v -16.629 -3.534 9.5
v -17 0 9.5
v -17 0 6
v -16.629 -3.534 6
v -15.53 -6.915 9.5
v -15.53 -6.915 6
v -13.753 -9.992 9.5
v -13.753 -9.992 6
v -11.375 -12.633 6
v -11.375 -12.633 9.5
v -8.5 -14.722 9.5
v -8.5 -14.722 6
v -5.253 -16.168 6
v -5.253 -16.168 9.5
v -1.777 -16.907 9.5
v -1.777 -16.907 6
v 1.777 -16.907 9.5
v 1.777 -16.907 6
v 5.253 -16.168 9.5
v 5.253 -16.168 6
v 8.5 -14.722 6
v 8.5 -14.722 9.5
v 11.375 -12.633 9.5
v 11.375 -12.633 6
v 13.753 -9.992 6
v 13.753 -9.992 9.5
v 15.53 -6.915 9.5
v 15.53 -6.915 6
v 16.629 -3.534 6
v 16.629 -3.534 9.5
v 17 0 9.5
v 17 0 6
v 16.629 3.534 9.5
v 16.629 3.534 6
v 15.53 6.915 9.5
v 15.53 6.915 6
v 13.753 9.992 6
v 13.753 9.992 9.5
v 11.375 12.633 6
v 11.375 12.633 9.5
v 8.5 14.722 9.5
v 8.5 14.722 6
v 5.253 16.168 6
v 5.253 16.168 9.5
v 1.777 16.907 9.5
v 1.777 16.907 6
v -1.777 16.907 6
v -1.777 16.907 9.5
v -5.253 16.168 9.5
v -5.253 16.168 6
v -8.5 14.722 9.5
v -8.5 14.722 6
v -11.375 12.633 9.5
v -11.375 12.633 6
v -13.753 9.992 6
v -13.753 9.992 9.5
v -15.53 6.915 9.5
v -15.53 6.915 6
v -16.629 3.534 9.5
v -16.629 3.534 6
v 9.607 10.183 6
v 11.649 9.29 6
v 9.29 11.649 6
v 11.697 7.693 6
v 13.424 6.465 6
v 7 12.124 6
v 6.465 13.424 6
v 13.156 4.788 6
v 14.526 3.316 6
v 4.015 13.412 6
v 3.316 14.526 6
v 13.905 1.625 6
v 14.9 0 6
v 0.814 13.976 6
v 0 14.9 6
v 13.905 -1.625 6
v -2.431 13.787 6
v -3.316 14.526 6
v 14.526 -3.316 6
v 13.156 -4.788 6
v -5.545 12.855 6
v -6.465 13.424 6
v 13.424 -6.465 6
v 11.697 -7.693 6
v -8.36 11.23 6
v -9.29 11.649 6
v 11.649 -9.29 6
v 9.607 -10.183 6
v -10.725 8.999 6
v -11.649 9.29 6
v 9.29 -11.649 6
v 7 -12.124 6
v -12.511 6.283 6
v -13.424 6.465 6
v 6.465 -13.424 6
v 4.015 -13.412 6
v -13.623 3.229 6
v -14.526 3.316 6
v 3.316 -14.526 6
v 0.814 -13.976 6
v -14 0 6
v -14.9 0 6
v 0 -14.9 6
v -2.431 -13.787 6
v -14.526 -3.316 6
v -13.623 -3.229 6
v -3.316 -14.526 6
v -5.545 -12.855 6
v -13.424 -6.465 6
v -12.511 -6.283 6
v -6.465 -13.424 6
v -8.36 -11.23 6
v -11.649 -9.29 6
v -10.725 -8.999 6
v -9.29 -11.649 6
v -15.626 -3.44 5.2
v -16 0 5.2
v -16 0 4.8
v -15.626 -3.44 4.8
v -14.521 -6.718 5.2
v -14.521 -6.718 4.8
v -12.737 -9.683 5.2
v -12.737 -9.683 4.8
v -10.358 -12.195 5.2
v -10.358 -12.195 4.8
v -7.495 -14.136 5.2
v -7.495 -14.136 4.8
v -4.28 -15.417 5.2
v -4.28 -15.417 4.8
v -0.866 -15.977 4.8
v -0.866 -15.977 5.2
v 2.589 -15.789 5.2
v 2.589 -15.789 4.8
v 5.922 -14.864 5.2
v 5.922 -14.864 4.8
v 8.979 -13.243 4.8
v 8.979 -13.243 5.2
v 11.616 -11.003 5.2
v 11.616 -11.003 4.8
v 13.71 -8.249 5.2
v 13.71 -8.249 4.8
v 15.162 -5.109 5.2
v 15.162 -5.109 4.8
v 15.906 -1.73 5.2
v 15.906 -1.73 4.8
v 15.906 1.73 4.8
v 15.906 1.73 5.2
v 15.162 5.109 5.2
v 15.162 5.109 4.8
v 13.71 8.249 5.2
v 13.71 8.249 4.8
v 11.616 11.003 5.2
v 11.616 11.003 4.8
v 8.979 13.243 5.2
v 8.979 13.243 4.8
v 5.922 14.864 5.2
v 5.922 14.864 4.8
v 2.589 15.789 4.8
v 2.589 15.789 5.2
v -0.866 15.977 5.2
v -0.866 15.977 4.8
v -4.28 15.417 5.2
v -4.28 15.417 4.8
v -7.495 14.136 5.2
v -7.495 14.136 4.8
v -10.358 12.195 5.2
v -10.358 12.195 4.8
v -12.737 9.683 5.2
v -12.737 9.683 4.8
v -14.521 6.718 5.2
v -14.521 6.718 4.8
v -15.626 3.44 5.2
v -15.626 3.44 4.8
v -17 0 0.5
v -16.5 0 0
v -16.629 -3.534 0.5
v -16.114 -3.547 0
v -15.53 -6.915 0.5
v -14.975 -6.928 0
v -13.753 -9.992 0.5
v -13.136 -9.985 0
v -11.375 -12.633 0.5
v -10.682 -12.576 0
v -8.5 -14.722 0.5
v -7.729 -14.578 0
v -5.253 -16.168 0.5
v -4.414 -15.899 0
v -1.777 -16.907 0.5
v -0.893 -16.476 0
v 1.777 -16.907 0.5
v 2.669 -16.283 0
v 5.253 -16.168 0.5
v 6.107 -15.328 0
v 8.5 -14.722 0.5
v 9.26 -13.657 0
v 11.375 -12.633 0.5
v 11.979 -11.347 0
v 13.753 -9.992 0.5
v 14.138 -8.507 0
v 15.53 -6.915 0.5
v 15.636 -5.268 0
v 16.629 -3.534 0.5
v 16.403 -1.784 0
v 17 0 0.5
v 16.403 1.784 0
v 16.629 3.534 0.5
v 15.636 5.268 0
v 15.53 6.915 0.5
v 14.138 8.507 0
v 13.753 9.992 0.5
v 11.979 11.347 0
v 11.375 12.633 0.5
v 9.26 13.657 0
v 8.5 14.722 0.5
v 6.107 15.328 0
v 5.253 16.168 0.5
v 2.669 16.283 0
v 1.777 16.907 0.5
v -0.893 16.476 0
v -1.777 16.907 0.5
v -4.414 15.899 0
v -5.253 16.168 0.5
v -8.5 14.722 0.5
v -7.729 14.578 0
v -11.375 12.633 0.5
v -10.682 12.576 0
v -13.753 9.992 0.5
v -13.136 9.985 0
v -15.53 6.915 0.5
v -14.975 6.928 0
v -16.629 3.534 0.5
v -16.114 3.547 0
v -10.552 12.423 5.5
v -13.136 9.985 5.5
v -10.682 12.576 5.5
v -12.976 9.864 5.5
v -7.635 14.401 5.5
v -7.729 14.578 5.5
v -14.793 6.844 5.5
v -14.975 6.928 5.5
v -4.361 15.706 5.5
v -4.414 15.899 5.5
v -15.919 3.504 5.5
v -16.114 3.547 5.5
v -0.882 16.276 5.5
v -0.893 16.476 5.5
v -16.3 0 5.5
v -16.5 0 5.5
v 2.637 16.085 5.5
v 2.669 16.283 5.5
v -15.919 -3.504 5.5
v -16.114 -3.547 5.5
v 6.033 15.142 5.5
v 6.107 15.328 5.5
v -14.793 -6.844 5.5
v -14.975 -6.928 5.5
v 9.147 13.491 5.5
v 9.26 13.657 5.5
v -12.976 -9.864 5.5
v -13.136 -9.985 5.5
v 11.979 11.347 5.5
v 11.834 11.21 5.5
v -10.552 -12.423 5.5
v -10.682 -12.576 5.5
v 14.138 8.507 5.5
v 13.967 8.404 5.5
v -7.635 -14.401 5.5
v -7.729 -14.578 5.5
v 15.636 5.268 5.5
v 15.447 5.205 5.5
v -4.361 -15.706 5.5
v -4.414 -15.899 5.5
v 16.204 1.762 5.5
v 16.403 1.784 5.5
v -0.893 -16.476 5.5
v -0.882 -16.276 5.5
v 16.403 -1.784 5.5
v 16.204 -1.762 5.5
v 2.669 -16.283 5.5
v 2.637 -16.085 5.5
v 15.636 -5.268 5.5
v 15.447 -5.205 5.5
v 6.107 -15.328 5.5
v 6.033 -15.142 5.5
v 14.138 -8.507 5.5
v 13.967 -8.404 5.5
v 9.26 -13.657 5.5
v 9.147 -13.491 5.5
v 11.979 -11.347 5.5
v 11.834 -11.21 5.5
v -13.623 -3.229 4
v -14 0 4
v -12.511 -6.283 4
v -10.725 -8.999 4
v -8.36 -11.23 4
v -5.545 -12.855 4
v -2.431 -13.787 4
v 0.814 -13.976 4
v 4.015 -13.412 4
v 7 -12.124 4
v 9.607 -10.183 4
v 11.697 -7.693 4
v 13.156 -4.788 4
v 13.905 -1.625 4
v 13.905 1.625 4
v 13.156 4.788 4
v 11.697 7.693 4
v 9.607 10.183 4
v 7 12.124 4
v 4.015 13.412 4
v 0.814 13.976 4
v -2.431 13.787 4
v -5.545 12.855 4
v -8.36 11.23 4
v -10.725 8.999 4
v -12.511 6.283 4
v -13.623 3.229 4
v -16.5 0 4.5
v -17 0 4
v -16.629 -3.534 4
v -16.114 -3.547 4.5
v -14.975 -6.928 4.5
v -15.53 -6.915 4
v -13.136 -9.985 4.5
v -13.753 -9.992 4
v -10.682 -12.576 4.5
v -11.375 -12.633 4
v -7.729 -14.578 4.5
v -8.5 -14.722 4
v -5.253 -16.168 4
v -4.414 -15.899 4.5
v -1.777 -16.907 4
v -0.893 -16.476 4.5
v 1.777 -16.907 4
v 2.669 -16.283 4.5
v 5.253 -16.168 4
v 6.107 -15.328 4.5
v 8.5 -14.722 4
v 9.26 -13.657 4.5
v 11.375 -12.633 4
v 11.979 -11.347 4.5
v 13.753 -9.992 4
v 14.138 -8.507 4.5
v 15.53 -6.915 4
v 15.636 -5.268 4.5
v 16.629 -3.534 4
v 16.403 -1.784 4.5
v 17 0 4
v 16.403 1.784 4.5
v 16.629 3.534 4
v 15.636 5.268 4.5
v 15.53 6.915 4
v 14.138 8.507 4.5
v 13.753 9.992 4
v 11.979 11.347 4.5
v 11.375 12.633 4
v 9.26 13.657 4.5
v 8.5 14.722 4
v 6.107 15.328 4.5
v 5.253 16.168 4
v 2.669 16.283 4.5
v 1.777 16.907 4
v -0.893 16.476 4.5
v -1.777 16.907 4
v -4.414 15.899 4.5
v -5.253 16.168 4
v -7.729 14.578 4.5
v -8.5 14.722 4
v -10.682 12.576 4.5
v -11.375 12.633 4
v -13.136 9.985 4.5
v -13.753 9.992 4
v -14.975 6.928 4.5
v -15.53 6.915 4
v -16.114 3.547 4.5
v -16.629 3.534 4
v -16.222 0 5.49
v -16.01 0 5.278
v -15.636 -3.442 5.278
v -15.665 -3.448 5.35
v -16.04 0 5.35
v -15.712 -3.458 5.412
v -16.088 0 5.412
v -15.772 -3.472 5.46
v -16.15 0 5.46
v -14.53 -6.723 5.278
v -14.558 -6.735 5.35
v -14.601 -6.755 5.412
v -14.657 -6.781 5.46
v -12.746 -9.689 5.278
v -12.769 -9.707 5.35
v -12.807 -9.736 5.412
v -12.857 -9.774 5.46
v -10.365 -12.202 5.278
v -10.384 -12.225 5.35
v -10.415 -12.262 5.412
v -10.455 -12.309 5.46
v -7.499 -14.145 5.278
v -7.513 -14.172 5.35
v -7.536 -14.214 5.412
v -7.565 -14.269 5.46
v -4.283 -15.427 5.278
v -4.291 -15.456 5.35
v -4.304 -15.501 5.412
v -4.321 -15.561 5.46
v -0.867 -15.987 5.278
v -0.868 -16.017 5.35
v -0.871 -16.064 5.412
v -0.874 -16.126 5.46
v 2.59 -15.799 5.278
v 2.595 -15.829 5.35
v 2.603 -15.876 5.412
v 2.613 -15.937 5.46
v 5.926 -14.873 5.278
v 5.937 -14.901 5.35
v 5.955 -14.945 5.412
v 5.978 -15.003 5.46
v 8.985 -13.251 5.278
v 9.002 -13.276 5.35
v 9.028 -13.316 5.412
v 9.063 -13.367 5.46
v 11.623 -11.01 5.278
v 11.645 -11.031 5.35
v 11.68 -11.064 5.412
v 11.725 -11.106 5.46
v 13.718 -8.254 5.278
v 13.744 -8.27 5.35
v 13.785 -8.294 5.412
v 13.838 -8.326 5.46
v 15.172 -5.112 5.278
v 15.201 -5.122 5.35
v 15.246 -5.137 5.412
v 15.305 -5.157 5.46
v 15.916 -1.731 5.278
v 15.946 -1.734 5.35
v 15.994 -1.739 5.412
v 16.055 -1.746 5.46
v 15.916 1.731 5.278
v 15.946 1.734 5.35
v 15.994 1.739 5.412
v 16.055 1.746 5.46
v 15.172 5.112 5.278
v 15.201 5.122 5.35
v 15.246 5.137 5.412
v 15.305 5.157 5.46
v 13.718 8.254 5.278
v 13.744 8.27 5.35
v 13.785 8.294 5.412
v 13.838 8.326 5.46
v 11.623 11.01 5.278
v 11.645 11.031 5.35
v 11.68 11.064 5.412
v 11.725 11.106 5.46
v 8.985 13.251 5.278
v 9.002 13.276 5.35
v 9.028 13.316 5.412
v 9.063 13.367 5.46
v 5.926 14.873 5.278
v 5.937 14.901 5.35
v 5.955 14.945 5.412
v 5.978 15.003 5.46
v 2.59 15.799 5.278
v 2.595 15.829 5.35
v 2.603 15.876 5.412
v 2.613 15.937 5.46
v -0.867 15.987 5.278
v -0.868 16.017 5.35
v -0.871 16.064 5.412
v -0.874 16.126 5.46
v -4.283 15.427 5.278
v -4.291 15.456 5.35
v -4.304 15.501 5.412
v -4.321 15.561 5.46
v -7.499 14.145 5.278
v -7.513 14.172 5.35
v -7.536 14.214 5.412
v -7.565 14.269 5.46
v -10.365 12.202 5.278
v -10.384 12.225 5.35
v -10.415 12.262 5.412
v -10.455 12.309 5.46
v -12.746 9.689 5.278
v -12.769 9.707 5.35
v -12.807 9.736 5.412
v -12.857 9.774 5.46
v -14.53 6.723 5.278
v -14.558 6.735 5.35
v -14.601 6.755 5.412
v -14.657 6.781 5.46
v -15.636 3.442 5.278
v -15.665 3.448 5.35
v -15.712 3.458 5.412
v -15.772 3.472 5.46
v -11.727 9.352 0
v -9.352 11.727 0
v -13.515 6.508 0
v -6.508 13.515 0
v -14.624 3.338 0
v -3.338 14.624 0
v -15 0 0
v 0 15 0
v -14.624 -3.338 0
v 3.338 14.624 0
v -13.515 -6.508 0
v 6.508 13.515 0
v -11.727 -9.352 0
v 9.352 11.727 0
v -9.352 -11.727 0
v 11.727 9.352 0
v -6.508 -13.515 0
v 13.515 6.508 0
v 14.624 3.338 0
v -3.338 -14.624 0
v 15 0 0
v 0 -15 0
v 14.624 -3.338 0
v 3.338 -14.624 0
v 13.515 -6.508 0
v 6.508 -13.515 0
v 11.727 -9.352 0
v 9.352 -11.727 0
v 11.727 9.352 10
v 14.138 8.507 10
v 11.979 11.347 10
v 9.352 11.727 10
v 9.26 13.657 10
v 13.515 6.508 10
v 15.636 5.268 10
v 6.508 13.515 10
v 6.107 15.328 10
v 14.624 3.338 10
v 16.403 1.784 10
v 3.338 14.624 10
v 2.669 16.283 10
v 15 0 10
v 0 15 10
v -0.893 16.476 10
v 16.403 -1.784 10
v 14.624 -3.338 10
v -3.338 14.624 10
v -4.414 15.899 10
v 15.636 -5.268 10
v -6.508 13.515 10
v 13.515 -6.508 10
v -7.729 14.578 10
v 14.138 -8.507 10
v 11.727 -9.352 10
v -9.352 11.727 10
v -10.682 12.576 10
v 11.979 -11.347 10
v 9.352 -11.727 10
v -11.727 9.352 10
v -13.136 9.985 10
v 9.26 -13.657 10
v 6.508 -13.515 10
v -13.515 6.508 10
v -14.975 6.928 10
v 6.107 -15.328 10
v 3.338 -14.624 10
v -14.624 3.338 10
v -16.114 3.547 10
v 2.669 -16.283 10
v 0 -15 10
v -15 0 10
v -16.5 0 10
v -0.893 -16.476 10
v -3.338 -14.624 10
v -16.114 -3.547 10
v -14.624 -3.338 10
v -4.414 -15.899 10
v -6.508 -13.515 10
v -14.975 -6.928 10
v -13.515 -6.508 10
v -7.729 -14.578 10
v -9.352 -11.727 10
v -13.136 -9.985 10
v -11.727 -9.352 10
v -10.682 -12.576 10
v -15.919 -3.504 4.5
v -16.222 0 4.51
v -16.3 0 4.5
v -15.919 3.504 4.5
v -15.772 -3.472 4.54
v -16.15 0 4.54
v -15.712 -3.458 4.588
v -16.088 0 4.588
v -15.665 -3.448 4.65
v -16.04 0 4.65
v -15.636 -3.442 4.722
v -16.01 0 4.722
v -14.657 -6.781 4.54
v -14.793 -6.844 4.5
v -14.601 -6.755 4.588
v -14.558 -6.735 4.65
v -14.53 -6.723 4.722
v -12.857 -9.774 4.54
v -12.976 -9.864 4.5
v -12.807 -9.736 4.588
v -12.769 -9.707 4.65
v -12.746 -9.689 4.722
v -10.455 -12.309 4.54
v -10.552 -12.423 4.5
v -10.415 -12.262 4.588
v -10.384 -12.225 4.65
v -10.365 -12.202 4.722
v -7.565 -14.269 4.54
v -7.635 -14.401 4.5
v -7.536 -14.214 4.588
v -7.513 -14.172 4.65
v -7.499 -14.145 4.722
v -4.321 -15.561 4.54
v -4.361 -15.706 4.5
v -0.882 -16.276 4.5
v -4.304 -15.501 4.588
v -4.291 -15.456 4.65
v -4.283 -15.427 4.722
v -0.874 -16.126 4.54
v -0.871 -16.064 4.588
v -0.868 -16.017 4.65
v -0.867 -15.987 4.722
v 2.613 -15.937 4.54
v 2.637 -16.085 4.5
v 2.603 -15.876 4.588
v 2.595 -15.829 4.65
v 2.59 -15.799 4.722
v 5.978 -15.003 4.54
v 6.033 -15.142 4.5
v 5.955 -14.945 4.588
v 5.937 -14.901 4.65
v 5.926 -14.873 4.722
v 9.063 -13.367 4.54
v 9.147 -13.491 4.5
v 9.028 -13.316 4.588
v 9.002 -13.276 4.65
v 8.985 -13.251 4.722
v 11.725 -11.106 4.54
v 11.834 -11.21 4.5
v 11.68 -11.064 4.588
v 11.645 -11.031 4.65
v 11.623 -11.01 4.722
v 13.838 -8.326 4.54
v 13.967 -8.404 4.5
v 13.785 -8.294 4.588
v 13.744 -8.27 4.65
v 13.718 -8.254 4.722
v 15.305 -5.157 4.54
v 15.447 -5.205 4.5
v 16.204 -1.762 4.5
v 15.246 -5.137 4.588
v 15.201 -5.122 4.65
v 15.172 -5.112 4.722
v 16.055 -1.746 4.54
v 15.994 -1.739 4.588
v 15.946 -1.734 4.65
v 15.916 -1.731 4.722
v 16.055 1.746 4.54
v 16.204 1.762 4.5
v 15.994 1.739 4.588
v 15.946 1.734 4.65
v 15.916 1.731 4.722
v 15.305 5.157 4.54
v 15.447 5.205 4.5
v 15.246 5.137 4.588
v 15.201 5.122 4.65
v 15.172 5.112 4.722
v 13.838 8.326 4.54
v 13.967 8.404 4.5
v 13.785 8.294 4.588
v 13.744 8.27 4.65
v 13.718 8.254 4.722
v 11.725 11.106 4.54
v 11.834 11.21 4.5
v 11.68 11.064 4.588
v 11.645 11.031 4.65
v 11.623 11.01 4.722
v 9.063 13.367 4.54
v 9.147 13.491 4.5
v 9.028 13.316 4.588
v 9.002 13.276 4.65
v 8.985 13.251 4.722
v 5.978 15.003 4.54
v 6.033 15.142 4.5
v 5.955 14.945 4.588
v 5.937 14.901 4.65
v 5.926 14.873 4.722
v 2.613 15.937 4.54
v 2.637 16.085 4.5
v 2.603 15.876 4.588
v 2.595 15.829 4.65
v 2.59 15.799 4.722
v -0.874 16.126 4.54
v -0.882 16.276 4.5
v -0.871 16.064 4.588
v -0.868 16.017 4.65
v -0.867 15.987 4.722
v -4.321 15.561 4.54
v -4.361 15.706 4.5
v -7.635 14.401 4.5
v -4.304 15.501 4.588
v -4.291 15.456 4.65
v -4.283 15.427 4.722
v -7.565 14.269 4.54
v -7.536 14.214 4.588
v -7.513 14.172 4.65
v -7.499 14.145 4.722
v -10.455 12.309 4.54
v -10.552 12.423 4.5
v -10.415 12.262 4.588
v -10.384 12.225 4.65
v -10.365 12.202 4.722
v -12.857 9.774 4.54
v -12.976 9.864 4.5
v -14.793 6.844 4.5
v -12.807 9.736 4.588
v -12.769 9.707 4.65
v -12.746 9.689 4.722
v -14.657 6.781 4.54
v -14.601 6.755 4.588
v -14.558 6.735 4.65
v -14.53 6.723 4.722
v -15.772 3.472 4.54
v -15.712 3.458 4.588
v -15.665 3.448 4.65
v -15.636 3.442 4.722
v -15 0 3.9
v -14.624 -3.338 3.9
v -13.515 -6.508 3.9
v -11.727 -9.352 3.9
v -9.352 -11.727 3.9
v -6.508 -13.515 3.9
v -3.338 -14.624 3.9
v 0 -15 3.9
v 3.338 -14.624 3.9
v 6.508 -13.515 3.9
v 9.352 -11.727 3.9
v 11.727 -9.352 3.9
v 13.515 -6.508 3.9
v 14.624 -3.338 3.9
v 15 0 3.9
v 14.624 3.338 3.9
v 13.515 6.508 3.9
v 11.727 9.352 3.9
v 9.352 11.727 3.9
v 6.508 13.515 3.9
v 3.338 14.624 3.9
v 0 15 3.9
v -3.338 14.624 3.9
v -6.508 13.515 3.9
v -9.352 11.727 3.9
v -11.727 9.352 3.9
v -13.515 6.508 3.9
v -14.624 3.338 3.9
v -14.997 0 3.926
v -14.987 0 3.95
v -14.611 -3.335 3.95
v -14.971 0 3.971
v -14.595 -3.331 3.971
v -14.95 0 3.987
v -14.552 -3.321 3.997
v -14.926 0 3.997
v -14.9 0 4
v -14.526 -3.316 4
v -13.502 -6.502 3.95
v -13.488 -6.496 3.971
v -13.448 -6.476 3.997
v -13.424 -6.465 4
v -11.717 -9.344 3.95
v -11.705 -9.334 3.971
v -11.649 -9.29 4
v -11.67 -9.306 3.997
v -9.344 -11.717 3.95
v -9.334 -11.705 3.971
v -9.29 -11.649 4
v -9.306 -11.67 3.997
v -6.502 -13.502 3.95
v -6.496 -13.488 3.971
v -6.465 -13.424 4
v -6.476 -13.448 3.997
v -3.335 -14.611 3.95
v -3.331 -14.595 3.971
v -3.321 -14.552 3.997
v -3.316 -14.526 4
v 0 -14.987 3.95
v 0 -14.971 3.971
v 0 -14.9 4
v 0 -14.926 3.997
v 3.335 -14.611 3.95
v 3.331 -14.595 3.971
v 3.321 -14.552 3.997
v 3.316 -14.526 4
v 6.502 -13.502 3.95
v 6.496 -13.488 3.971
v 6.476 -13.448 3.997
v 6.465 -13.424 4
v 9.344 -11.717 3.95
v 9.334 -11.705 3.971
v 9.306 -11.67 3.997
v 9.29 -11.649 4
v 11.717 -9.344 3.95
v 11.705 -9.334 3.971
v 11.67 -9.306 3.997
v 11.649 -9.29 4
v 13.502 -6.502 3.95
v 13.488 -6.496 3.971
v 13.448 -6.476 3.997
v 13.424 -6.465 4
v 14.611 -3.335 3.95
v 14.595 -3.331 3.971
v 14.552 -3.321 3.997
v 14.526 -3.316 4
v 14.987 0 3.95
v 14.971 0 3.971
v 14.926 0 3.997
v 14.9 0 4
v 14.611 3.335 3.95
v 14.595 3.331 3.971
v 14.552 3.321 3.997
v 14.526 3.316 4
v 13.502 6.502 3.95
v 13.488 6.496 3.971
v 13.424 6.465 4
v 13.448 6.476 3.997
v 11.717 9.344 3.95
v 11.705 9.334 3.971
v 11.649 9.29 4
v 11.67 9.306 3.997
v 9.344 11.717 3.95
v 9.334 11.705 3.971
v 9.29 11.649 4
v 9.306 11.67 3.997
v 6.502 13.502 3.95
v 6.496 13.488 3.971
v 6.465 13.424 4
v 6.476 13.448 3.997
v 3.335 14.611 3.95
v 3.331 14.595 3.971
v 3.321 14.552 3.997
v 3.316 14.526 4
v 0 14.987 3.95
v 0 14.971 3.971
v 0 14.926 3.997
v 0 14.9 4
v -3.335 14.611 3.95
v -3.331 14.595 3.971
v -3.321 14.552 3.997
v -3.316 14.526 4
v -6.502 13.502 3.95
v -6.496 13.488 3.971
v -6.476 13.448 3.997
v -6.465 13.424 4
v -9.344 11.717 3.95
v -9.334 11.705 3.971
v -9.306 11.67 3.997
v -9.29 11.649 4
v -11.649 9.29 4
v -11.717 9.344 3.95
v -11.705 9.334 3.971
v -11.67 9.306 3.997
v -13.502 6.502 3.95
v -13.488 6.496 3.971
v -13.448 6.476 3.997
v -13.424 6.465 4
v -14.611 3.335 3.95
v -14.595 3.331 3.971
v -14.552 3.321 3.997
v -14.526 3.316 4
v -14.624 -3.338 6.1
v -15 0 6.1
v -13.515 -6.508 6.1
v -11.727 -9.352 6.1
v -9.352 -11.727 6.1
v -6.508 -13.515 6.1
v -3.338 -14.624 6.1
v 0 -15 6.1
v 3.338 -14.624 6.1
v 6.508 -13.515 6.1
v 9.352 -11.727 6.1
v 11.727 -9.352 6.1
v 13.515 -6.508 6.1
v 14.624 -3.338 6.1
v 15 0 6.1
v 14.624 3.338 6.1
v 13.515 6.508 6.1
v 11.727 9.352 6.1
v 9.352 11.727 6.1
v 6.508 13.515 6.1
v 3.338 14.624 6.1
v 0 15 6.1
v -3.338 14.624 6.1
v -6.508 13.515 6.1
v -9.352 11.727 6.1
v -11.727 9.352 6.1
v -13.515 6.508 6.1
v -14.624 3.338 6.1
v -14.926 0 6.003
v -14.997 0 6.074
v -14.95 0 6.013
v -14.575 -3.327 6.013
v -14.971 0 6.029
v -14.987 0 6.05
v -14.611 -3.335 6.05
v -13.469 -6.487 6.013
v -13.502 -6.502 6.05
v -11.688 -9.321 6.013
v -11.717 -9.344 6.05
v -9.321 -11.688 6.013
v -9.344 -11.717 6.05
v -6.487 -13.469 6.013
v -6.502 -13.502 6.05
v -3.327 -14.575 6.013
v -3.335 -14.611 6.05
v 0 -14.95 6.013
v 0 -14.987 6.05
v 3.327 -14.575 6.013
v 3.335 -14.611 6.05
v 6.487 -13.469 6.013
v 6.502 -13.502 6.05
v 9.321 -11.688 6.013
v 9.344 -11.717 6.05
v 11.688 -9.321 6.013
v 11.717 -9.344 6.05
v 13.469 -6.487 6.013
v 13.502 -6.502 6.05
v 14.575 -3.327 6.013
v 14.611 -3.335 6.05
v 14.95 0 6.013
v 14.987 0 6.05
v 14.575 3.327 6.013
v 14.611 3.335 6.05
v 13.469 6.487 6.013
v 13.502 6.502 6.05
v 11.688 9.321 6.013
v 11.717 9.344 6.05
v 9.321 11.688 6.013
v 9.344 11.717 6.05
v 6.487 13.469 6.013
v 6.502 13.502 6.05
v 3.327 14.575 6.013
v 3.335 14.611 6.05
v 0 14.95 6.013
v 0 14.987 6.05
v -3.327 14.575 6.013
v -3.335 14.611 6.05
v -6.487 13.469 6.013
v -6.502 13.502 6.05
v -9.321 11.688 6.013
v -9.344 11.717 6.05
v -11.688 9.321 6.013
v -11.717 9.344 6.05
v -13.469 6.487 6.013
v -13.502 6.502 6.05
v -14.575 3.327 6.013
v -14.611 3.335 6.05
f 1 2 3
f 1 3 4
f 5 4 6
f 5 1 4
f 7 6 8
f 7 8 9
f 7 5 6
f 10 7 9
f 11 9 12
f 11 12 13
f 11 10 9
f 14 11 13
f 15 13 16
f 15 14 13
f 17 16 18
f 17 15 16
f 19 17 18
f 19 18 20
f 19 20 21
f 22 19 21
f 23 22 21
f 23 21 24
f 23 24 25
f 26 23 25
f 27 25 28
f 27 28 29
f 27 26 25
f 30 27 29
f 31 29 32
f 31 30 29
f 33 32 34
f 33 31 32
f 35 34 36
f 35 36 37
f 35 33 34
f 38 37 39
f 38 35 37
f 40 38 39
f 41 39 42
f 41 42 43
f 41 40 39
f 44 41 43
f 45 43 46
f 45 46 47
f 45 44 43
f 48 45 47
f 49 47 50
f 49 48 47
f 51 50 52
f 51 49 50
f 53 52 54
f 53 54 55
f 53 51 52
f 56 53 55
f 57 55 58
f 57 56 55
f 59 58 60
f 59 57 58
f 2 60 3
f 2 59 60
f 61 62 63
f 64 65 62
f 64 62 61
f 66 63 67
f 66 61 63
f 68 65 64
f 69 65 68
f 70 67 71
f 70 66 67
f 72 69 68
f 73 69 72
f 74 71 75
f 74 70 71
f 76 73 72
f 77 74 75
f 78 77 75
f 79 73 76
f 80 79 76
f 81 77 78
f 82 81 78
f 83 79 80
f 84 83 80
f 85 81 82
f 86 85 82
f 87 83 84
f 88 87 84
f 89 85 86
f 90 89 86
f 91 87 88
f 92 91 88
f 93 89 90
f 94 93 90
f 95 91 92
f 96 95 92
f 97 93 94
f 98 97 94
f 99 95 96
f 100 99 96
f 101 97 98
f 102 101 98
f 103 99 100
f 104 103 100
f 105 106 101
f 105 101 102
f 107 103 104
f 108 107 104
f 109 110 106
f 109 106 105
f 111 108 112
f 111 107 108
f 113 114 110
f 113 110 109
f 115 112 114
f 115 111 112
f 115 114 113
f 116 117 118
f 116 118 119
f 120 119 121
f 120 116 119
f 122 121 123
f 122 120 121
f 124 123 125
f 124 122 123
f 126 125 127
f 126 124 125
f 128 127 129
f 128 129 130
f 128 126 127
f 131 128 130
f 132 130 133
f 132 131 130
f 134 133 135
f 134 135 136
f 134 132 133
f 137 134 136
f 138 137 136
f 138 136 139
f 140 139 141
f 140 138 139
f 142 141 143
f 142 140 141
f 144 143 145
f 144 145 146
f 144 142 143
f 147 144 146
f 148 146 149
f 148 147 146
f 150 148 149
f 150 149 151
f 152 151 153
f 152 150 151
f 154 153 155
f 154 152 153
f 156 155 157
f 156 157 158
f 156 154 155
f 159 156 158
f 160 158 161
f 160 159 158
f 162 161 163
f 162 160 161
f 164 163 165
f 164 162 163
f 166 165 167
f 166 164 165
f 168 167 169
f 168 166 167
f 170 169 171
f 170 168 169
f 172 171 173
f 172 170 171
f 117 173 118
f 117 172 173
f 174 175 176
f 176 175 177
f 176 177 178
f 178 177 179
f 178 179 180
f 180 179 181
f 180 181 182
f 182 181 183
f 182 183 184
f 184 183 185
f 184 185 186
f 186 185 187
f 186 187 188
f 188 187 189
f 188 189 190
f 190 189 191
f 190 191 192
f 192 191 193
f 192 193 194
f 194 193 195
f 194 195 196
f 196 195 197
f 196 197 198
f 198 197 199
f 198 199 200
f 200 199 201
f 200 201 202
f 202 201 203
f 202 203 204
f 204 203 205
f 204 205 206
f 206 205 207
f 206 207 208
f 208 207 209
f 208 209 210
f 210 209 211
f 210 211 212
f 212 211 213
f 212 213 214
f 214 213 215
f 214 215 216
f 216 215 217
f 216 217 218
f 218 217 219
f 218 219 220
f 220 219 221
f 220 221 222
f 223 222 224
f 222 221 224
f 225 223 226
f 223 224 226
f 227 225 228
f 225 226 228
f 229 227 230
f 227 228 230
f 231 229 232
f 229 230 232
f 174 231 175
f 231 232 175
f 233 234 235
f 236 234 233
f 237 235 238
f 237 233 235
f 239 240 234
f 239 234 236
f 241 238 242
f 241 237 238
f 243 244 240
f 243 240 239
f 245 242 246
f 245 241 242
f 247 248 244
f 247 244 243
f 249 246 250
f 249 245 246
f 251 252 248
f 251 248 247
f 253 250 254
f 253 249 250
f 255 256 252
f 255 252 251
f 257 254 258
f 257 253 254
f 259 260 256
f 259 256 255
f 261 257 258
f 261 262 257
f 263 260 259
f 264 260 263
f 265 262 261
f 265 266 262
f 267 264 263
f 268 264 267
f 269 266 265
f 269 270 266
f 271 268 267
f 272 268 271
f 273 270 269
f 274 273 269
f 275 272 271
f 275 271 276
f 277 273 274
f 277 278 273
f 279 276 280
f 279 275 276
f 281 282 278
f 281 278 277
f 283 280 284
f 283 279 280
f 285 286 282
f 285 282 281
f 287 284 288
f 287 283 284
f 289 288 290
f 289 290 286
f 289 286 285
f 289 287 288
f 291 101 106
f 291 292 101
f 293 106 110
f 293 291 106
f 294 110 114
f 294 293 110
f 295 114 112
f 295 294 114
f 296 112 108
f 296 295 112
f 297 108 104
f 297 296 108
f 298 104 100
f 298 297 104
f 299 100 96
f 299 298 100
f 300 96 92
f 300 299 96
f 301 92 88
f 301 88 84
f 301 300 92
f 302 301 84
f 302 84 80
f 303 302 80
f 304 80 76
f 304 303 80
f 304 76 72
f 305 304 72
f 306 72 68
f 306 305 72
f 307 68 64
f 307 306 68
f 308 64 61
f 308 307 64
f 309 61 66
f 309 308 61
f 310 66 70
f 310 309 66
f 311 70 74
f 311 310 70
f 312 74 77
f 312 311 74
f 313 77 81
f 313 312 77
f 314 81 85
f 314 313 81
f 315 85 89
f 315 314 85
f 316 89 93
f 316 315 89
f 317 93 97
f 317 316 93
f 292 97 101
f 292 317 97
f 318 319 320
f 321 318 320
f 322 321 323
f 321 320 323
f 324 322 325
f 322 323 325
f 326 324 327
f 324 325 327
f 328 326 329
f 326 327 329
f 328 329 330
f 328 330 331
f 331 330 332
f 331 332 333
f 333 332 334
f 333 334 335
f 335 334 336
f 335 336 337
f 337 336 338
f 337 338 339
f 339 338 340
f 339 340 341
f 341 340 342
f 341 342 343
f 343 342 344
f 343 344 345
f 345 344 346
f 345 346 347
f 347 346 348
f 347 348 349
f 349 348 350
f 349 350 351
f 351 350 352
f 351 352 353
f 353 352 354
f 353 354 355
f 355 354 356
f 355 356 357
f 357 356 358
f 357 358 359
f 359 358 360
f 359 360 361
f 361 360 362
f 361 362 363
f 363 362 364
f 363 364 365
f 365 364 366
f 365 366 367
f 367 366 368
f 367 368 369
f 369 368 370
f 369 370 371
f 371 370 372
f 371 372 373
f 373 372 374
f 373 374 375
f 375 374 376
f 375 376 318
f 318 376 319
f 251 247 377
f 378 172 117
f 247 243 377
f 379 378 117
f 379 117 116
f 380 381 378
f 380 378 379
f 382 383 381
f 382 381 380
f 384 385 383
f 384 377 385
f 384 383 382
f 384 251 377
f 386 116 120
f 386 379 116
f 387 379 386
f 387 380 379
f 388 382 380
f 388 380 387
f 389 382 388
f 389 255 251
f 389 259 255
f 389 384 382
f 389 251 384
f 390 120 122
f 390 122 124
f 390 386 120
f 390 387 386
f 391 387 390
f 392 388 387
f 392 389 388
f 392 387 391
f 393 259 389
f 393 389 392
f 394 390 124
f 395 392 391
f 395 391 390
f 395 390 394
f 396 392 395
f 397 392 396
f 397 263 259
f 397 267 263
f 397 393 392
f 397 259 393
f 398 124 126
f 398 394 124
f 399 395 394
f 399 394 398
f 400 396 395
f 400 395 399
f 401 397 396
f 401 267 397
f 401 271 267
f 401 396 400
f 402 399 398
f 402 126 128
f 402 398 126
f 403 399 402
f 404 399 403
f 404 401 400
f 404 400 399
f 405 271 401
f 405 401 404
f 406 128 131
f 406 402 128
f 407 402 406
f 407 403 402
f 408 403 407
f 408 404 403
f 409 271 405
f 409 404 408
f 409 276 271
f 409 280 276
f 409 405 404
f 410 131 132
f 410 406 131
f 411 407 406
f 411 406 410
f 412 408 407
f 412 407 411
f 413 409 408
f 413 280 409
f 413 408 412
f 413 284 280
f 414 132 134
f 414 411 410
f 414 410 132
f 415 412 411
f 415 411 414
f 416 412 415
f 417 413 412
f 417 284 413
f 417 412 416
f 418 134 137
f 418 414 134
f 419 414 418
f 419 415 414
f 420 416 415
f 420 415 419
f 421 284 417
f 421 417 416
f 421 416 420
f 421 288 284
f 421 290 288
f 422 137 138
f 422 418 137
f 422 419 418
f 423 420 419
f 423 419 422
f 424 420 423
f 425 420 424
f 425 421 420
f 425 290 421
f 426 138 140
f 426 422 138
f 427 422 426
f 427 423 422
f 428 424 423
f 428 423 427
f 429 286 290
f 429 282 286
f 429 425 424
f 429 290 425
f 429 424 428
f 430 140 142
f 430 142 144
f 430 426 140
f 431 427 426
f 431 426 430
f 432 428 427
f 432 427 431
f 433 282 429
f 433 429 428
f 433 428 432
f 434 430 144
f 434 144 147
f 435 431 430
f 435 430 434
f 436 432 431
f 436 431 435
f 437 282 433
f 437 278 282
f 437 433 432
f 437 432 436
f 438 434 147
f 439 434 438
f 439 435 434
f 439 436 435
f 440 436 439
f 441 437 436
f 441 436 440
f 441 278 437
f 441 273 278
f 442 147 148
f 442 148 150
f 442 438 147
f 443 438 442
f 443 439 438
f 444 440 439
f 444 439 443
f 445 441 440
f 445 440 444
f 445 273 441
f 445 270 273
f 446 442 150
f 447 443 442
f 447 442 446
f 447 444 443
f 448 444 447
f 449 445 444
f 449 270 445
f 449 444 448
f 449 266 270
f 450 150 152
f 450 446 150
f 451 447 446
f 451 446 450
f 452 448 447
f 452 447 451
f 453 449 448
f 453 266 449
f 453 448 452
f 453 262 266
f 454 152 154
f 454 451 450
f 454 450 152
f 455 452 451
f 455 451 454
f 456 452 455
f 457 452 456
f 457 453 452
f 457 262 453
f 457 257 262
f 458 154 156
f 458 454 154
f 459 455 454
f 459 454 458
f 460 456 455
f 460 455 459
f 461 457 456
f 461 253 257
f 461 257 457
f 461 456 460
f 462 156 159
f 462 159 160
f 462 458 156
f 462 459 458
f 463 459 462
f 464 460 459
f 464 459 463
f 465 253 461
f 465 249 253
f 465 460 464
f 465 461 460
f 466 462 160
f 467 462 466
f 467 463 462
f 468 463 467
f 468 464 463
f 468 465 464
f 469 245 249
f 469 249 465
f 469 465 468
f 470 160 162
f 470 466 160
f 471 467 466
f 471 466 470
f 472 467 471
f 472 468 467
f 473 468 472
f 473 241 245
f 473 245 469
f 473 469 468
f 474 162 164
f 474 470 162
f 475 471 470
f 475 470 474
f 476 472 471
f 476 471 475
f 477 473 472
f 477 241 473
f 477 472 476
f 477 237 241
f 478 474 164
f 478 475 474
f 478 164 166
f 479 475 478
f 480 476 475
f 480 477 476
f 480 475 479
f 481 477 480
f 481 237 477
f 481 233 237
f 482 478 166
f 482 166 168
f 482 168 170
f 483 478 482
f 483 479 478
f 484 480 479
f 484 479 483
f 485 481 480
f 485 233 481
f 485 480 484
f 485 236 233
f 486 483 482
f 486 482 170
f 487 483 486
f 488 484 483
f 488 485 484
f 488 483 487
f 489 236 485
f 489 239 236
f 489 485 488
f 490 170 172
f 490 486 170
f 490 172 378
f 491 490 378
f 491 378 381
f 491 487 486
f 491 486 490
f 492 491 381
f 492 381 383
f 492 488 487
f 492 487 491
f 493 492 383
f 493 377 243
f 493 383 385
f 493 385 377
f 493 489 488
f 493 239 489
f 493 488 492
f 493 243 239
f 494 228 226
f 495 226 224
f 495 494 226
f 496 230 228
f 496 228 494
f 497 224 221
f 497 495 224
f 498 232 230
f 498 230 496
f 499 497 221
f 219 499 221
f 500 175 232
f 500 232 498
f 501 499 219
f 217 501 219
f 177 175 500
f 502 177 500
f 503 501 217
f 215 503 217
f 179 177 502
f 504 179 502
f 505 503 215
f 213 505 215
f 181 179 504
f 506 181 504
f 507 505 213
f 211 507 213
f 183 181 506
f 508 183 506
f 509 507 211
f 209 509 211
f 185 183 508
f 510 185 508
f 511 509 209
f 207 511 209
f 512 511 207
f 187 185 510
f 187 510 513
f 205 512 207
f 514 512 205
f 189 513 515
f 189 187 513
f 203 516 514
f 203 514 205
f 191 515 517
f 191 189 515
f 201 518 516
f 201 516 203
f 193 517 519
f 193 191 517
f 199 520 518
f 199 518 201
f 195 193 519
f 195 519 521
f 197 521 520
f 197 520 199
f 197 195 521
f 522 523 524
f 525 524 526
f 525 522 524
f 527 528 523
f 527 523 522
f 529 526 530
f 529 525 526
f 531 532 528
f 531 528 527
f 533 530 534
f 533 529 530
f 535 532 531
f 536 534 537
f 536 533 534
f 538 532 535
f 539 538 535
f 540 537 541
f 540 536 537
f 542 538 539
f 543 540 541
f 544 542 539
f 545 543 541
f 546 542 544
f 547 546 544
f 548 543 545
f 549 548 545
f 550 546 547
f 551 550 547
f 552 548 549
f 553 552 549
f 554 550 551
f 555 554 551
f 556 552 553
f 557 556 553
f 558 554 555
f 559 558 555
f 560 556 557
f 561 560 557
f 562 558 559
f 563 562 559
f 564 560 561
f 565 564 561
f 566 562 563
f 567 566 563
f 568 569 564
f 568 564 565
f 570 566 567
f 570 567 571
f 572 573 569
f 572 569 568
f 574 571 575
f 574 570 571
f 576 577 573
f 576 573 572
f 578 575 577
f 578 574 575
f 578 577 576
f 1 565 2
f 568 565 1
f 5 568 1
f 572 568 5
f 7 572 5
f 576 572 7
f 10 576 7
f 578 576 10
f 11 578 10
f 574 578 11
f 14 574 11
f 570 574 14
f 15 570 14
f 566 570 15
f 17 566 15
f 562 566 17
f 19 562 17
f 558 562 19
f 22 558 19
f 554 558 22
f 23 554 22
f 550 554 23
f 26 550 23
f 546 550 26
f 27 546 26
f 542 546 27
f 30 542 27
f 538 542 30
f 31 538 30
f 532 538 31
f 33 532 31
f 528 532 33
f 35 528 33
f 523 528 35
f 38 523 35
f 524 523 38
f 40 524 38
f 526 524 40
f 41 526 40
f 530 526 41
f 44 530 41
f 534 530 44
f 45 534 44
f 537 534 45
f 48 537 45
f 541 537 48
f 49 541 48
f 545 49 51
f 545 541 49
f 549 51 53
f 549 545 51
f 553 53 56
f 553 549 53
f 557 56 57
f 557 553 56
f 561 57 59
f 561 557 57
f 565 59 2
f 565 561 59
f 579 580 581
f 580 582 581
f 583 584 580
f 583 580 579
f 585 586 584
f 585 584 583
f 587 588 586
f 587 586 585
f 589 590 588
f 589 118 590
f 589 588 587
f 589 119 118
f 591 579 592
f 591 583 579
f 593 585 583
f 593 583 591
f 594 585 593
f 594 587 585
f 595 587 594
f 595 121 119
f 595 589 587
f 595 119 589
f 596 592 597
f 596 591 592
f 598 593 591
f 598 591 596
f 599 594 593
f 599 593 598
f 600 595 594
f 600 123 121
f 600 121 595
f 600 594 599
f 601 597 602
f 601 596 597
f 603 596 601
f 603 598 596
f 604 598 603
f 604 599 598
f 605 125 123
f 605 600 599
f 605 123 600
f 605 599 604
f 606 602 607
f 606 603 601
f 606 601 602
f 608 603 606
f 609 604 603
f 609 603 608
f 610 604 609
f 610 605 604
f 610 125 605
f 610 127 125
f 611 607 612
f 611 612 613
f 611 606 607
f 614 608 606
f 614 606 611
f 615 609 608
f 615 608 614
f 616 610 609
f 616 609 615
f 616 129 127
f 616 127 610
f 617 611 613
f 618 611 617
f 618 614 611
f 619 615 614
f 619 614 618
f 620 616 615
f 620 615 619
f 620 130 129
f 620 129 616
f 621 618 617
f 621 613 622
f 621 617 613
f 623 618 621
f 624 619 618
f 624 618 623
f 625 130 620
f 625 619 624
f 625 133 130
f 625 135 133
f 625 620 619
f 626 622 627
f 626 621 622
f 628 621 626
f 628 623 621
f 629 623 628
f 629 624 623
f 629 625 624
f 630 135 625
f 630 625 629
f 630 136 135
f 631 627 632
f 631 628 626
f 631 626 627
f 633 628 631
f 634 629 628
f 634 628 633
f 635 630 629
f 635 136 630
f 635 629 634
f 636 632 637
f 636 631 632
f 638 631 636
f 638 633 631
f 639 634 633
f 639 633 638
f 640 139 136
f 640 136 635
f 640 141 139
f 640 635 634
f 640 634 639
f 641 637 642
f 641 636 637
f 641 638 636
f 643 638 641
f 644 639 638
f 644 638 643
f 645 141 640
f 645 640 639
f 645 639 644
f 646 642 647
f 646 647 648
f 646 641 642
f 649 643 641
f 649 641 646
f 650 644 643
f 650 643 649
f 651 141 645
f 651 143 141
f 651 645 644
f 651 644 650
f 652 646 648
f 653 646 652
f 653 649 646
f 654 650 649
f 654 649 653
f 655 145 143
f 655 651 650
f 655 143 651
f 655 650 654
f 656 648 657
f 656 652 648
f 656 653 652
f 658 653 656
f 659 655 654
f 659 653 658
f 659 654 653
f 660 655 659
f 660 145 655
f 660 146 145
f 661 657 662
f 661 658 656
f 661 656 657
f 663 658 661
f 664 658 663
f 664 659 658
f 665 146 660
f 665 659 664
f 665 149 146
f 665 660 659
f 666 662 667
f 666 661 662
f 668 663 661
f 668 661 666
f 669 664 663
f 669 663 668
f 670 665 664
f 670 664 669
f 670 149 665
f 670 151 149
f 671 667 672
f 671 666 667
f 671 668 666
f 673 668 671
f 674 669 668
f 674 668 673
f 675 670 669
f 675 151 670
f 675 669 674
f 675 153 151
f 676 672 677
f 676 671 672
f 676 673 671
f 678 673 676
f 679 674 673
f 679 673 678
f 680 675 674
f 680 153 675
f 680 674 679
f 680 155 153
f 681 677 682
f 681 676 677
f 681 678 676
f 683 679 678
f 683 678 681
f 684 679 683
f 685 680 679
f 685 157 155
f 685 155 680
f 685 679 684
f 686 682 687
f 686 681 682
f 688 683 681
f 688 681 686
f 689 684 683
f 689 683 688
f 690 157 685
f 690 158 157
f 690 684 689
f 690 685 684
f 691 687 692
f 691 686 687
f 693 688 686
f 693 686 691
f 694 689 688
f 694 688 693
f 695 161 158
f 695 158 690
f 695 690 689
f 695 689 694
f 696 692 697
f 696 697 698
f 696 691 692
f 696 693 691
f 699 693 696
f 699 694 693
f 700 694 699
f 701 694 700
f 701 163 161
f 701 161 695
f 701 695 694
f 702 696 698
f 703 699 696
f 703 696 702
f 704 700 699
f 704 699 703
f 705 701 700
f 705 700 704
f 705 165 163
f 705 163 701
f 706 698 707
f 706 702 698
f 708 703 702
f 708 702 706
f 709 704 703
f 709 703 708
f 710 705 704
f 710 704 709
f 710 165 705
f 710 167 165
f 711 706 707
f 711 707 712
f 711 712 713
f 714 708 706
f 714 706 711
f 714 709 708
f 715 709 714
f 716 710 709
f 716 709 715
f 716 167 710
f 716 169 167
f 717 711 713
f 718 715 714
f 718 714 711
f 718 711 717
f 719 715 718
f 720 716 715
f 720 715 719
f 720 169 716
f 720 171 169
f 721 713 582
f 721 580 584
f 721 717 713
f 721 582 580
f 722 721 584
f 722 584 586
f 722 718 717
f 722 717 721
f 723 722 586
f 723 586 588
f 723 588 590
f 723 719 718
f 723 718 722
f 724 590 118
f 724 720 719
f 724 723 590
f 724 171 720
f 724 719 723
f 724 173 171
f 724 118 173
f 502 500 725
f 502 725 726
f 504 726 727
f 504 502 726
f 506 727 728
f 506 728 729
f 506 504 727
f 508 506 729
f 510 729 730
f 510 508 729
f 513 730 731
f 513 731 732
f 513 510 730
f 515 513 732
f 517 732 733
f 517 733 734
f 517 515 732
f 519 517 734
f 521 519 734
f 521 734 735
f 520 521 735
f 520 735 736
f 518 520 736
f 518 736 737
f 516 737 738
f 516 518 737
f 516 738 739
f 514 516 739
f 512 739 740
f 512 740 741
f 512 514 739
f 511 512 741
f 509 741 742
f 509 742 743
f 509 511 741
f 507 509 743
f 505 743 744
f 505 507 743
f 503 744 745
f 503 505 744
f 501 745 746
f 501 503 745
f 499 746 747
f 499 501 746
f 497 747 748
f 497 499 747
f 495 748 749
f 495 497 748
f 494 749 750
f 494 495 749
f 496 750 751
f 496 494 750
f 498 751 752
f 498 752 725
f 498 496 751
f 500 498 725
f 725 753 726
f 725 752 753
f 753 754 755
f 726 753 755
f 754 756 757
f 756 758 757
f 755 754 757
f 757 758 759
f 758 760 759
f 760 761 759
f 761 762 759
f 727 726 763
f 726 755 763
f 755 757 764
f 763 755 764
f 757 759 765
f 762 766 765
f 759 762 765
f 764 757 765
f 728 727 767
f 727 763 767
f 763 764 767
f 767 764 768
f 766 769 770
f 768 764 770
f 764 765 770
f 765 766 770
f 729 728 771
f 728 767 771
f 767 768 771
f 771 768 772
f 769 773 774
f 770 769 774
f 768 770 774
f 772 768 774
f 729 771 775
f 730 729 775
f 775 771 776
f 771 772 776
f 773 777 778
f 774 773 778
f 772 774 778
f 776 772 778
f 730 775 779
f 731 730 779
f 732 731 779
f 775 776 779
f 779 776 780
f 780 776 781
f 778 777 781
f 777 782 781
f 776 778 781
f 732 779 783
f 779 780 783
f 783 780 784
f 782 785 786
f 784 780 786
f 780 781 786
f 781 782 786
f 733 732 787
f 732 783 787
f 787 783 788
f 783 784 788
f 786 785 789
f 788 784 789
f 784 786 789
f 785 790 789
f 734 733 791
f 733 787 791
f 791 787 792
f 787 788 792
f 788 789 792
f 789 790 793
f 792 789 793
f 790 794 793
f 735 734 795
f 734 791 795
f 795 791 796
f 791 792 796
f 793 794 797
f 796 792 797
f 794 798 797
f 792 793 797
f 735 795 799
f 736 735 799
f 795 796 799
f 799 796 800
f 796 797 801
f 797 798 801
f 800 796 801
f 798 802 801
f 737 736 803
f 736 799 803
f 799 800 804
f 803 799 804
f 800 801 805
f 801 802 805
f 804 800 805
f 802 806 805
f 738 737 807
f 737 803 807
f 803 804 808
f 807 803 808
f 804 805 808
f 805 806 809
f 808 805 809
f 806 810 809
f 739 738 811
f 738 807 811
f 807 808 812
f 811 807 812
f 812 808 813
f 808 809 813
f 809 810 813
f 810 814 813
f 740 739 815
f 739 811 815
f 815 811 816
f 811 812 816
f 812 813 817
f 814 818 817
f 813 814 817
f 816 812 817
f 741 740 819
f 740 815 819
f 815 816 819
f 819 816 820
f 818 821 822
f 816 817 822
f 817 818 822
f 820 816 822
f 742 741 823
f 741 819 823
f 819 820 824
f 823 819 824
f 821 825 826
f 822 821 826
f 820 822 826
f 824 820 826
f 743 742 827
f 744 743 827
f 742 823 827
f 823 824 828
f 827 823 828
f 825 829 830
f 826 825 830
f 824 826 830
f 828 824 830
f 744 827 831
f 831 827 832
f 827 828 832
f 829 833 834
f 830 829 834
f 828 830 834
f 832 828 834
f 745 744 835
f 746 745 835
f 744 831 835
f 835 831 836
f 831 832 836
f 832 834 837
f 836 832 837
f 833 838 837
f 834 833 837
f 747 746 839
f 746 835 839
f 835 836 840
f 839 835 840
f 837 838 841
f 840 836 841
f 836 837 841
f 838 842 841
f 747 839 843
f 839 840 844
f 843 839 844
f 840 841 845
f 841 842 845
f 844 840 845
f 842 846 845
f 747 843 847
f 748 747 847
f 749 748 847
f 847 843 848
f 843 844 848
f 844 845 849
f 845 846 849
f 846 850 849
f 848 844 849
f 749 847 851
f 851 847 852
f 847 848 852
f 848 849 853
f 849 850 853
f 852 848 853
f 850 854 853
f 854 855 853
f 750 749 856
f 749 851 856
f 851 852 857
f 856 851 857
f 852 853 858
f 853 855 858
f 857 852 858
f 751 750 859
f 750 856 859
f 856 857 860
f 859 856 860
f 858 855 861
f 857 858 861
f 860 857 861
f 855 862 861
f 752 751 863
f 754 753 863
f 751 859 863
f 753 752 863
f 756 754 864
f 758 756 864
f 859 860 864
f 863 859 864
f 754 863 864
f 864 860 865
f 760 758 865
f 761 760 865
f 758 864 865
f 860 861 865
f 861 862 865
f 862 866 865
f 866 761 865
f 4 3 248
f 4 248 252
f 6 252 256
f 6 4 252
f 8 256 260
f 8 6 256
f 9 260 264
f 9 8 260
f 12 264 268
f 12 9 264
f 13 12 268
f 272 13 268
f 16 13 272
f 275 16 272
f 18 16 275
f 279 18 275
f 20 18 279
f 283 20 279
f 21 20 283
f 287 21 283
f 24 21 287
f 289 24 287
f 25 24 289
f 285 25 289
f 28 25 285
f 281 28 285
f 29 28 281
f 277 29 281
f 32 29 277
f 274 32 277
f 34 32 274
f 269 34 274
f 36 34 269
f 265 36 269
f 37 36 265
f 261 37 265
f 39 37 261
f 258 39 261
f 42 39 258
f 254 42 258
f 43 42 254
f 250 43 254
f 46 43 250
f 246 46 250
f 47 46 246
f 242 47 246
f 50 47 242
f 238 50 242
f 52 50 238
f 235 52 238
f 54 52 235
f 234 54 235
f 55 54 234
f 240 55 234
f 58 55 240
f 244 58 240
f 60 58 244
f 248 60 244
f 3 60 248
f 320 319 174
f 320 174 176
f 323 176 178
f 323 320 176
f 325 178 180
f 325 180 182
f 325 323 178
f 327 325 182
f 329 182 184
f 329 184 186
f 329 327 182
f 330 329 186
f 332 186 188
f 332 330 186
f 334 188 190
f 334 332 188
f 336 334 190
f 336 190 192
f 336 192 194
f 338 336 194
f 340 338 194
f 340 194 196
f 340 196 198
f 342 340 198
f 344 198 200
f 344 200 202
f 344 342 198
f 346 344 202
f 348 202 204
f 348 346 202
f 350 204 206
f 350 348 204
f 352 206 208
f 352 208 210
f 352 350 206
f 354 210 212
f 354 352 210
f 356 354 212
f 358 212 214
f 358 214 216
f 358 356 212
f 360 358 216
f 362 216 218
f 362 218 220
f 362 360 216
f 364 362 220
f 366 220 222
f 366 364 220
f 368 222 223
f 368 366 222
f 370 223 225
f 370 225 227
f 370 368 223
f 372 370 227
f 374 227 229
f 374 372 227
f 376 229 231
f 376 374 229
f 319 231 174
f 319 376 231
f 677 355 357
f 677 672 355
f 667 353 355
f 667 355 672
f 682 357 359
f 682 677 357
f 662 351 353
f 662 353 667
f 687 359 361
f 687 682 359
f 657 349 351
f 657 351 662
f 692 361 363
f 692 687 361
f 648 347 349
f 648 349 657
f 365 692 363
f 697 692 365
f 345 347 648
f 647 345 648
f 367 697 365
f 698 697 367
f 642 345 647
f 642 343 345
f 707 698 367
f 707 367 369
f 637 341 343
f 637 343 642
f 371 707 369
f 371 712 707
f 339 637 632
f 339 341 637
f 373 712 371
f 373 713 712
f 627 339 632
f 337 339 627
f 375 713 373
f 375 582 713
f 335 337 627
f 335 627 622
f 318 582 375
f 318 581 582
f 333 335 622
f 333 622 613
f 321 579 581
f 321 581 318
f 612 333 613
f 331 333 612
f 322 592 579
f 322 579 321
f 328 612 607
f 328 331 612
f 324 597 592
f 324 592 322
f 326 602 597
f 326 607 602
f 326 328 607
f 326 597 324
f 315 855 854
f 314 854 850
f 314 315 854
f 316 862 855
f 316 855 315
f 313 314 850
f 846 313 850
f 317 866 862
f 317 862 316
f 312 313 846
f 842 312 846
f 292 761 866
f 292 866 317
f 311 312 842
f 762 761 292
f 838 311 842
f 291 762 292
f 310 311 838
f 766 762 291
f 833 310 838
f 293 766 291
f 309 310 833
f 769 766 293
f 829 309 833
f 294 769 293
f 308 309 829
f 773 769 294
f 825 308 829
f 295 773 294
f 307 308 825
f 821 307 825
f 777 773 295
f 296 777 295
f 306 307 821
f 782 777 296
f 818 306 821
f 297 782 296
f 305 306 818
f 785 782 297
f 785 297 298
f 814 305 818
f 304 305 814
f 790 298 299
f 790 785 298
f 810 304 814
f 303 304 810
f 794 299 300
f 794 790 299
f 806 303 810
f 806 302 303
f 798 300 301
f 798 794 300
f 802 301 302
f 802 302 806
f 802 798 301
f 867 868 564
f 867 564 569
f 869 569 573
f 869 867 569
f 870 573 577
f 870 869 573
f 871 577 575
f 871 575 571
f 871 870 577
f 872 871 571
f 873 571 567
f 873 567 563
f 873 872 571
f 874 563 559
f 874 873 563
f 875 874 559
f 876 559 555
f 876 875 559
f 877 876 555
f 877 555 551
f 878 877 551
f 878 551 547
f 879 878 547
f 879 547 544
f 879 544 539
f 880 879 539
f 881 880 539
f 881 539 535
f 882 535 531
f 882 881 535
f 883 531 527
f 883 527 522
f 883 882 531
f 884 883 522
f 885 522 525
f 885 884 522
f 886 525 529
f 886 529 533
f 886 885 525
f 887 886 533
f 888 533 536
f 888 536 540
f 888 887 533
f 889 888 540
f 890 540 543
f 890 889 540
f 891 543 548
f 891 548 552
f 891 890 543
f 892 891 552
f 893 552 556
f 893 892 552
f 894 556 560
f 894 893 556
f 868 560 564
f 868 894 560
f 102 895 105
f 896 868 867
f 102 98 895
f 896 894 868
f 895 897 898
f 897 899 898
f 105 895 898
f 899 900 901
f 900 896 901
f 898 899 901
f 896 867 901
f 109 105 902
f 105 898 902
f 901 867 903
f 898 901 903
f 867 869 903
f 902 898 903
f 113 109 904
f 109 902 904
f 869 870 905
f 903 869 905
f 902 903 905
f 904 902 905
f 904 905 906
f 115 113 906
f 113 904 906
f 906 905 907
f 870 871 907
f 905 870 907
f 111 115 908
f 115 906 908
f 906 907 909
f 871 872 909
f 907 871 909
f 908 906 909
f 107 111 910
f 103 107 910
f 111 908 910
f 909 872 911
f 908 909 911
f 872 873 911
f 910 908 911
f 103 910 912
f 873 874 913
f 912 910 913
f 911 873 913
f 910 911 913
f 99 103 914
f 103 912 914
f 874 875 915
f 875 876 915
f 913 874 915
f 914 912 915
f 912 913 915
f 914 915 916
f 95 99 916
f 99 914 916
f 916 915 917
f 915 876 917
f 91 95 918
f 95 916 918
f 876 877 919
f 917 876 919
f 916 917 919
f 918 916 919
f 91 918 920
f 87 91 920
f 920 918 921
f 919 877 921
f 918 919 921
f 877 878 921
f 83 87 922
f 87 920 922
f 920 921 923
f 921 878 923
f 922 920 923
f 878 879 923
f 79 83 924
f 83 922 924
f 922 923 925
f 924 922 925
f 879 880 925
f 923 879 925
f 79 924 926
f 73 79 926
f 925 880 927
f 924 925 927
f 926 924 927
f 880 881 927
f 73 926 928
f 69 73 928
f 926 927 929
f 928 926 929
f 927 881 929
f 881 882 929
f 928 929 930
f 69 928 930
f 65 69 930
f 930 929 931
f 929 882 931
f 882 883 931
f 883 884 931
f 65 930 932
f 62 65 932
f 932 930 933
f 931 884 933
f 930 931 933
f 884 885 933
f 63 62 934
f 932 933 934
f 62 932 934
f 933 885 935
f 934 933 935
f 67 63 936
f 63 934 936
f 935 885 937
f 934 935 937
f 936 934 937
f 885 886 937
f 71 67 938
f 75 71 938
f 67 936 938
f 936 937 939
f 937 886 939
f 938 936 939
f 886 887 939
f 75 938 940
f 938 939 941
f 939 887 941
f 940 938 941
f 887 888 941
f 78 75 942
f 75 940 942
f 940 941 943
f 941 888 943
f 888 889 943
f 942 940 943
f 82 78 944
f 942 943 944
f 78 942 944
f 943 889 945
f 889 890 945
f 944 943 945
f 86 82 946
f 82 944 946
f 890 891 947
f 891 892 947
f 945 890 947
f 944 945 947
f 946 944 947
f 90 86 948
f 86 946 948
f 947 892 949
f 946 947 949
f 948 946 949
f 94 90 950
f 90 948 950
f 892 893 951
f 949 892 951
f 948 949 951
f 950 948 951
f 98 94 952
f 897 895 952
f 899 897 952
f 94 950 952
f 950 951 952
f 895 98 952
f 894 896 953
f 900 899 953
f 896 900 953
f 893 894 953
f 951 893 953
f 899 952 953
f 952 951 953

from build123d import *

# Parameters (mm, degrees)
FILLET_1_R     = 0.3
CHAMFER_1_SIZE = 0.5
FILLET_2_R     = 0.1


with BuildPart() as part:
    # Эскиз18 → Повернуть1 (revolve)
    with BuildSketch(Plane(origin=(0, 0, 0), x_dir=(0, 0, -1), z_dir=(1, 0, 0)), mode=Mode.PRIVATE) as revolve_1_sk:
        Polygon((-10, -15), (-6, -15), (-6, -14), (-4, -14), (-4, -15), (0, -15), (0, -17), (-4.5, -17), (-4.5, -16), (-5.5, -16), (-5.5, -17), (-10, -17), align=None)
    revolve(revolve_1_sk.sketch.rotate(Axis((0, 0, 0), (0, 0, 1)), 270), axis=Axis((0, 0, 0), (0, 0, 1)))

    # Скругление1
    fillet_1_edges = [part.edges().sort_by_distance(p)[0] for p in [
        (16, 0, 5.5),
        (16, 0, 4.5),
    ]]
    fillet(fillet_1_edges, radius=FILLET_1_R)

    # Фаска1
    chamfer_1_edges = [part.edges().sort_by_distance(p)[0] for p in [
        (17, 0, 0),
        (17, 0, 10),
        (17, 0, 5.5),
        (17, 0, 4.5),
    ]]
    chamfer(chamfer_1_edges, length=CHAMFER_1_SIZE)

    # Скругление2
    fillet_2_edges = [part.edges().sort_by_distance(p)[0] for p in [
        (15, 0, 4),
        (15, 0, 6),
    ]]
    fillet(fillet_2_edges, radius=FILLET_2_R)


solid = part.part
